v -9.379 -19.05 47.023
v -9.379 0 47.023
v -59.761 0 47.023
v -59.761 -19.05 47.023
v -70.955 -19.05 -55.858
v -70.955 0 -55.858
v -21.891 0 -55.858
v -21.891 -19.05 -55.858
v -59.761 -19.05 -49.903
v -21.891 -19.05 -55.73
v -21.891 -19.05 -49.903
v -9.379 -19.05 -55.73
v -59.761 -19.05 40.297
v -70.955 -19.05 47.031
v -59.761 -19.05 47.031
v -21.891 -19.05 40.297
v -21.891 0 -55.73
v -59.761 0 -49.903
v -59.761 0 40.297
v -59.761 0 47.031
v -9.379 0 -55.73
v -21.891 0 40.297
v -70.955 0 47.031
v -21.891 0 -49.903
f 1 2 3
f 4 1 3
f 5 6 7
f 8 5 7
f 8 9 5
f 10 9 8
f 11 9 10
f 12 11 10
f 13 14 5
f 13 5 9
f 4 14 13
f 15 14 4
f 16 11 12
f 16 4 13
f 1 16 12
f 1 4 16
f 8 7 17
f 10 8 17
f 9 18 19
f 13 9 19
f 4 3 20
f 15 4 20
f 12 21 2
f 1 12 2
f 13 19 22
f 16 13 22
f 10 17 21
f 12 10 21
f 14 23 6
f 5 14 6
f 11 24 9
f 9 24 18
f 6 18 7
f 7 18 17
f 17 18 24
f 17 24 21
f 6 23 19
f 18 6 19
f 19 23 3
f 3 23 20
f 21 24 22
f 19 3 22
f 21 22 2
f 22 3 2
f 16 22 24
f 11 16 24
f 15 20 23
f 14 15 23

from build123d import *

# Parameters (mm, degrees)
F0_W     = 37.869452
F0_H     = 6.726544
F1_DEPTH = 19.05


with BuildPart() as f1:
    # F0 (on Front) → F1 (new body)
    with BuildSketch(Plane.XZ):
        Polygon((-59.760556, 47.031272), (-70.955373, 47.031272), (-70.955373, -55.858262), (-59.760556, -55.858262), (-59.760556, -49.902789), (-59.760556, 40.296745), (-59.760556, 47.023289), align=None)
        Polygon((-9.379123, 47.023289), (-21.891104, 47.023289), (-21.891104, 40.296745), (-21.891104, -49.902789), (-21.891104, -55.730475), (-9.379123, -55.730475), align=None)
        Polygon((-59.760556, -49.902789), (-59.760556, -55.858262), (-21.891104, -55.858262), (-21.891104, -55.730475), (-21.891104, -49.902789), align=None)
        with Locations((-40.82583, 43.660017)):
            Rectangle(F0_W, F0_H)
    extrude(amount=F1_DEPTH)


solid = f1.part
